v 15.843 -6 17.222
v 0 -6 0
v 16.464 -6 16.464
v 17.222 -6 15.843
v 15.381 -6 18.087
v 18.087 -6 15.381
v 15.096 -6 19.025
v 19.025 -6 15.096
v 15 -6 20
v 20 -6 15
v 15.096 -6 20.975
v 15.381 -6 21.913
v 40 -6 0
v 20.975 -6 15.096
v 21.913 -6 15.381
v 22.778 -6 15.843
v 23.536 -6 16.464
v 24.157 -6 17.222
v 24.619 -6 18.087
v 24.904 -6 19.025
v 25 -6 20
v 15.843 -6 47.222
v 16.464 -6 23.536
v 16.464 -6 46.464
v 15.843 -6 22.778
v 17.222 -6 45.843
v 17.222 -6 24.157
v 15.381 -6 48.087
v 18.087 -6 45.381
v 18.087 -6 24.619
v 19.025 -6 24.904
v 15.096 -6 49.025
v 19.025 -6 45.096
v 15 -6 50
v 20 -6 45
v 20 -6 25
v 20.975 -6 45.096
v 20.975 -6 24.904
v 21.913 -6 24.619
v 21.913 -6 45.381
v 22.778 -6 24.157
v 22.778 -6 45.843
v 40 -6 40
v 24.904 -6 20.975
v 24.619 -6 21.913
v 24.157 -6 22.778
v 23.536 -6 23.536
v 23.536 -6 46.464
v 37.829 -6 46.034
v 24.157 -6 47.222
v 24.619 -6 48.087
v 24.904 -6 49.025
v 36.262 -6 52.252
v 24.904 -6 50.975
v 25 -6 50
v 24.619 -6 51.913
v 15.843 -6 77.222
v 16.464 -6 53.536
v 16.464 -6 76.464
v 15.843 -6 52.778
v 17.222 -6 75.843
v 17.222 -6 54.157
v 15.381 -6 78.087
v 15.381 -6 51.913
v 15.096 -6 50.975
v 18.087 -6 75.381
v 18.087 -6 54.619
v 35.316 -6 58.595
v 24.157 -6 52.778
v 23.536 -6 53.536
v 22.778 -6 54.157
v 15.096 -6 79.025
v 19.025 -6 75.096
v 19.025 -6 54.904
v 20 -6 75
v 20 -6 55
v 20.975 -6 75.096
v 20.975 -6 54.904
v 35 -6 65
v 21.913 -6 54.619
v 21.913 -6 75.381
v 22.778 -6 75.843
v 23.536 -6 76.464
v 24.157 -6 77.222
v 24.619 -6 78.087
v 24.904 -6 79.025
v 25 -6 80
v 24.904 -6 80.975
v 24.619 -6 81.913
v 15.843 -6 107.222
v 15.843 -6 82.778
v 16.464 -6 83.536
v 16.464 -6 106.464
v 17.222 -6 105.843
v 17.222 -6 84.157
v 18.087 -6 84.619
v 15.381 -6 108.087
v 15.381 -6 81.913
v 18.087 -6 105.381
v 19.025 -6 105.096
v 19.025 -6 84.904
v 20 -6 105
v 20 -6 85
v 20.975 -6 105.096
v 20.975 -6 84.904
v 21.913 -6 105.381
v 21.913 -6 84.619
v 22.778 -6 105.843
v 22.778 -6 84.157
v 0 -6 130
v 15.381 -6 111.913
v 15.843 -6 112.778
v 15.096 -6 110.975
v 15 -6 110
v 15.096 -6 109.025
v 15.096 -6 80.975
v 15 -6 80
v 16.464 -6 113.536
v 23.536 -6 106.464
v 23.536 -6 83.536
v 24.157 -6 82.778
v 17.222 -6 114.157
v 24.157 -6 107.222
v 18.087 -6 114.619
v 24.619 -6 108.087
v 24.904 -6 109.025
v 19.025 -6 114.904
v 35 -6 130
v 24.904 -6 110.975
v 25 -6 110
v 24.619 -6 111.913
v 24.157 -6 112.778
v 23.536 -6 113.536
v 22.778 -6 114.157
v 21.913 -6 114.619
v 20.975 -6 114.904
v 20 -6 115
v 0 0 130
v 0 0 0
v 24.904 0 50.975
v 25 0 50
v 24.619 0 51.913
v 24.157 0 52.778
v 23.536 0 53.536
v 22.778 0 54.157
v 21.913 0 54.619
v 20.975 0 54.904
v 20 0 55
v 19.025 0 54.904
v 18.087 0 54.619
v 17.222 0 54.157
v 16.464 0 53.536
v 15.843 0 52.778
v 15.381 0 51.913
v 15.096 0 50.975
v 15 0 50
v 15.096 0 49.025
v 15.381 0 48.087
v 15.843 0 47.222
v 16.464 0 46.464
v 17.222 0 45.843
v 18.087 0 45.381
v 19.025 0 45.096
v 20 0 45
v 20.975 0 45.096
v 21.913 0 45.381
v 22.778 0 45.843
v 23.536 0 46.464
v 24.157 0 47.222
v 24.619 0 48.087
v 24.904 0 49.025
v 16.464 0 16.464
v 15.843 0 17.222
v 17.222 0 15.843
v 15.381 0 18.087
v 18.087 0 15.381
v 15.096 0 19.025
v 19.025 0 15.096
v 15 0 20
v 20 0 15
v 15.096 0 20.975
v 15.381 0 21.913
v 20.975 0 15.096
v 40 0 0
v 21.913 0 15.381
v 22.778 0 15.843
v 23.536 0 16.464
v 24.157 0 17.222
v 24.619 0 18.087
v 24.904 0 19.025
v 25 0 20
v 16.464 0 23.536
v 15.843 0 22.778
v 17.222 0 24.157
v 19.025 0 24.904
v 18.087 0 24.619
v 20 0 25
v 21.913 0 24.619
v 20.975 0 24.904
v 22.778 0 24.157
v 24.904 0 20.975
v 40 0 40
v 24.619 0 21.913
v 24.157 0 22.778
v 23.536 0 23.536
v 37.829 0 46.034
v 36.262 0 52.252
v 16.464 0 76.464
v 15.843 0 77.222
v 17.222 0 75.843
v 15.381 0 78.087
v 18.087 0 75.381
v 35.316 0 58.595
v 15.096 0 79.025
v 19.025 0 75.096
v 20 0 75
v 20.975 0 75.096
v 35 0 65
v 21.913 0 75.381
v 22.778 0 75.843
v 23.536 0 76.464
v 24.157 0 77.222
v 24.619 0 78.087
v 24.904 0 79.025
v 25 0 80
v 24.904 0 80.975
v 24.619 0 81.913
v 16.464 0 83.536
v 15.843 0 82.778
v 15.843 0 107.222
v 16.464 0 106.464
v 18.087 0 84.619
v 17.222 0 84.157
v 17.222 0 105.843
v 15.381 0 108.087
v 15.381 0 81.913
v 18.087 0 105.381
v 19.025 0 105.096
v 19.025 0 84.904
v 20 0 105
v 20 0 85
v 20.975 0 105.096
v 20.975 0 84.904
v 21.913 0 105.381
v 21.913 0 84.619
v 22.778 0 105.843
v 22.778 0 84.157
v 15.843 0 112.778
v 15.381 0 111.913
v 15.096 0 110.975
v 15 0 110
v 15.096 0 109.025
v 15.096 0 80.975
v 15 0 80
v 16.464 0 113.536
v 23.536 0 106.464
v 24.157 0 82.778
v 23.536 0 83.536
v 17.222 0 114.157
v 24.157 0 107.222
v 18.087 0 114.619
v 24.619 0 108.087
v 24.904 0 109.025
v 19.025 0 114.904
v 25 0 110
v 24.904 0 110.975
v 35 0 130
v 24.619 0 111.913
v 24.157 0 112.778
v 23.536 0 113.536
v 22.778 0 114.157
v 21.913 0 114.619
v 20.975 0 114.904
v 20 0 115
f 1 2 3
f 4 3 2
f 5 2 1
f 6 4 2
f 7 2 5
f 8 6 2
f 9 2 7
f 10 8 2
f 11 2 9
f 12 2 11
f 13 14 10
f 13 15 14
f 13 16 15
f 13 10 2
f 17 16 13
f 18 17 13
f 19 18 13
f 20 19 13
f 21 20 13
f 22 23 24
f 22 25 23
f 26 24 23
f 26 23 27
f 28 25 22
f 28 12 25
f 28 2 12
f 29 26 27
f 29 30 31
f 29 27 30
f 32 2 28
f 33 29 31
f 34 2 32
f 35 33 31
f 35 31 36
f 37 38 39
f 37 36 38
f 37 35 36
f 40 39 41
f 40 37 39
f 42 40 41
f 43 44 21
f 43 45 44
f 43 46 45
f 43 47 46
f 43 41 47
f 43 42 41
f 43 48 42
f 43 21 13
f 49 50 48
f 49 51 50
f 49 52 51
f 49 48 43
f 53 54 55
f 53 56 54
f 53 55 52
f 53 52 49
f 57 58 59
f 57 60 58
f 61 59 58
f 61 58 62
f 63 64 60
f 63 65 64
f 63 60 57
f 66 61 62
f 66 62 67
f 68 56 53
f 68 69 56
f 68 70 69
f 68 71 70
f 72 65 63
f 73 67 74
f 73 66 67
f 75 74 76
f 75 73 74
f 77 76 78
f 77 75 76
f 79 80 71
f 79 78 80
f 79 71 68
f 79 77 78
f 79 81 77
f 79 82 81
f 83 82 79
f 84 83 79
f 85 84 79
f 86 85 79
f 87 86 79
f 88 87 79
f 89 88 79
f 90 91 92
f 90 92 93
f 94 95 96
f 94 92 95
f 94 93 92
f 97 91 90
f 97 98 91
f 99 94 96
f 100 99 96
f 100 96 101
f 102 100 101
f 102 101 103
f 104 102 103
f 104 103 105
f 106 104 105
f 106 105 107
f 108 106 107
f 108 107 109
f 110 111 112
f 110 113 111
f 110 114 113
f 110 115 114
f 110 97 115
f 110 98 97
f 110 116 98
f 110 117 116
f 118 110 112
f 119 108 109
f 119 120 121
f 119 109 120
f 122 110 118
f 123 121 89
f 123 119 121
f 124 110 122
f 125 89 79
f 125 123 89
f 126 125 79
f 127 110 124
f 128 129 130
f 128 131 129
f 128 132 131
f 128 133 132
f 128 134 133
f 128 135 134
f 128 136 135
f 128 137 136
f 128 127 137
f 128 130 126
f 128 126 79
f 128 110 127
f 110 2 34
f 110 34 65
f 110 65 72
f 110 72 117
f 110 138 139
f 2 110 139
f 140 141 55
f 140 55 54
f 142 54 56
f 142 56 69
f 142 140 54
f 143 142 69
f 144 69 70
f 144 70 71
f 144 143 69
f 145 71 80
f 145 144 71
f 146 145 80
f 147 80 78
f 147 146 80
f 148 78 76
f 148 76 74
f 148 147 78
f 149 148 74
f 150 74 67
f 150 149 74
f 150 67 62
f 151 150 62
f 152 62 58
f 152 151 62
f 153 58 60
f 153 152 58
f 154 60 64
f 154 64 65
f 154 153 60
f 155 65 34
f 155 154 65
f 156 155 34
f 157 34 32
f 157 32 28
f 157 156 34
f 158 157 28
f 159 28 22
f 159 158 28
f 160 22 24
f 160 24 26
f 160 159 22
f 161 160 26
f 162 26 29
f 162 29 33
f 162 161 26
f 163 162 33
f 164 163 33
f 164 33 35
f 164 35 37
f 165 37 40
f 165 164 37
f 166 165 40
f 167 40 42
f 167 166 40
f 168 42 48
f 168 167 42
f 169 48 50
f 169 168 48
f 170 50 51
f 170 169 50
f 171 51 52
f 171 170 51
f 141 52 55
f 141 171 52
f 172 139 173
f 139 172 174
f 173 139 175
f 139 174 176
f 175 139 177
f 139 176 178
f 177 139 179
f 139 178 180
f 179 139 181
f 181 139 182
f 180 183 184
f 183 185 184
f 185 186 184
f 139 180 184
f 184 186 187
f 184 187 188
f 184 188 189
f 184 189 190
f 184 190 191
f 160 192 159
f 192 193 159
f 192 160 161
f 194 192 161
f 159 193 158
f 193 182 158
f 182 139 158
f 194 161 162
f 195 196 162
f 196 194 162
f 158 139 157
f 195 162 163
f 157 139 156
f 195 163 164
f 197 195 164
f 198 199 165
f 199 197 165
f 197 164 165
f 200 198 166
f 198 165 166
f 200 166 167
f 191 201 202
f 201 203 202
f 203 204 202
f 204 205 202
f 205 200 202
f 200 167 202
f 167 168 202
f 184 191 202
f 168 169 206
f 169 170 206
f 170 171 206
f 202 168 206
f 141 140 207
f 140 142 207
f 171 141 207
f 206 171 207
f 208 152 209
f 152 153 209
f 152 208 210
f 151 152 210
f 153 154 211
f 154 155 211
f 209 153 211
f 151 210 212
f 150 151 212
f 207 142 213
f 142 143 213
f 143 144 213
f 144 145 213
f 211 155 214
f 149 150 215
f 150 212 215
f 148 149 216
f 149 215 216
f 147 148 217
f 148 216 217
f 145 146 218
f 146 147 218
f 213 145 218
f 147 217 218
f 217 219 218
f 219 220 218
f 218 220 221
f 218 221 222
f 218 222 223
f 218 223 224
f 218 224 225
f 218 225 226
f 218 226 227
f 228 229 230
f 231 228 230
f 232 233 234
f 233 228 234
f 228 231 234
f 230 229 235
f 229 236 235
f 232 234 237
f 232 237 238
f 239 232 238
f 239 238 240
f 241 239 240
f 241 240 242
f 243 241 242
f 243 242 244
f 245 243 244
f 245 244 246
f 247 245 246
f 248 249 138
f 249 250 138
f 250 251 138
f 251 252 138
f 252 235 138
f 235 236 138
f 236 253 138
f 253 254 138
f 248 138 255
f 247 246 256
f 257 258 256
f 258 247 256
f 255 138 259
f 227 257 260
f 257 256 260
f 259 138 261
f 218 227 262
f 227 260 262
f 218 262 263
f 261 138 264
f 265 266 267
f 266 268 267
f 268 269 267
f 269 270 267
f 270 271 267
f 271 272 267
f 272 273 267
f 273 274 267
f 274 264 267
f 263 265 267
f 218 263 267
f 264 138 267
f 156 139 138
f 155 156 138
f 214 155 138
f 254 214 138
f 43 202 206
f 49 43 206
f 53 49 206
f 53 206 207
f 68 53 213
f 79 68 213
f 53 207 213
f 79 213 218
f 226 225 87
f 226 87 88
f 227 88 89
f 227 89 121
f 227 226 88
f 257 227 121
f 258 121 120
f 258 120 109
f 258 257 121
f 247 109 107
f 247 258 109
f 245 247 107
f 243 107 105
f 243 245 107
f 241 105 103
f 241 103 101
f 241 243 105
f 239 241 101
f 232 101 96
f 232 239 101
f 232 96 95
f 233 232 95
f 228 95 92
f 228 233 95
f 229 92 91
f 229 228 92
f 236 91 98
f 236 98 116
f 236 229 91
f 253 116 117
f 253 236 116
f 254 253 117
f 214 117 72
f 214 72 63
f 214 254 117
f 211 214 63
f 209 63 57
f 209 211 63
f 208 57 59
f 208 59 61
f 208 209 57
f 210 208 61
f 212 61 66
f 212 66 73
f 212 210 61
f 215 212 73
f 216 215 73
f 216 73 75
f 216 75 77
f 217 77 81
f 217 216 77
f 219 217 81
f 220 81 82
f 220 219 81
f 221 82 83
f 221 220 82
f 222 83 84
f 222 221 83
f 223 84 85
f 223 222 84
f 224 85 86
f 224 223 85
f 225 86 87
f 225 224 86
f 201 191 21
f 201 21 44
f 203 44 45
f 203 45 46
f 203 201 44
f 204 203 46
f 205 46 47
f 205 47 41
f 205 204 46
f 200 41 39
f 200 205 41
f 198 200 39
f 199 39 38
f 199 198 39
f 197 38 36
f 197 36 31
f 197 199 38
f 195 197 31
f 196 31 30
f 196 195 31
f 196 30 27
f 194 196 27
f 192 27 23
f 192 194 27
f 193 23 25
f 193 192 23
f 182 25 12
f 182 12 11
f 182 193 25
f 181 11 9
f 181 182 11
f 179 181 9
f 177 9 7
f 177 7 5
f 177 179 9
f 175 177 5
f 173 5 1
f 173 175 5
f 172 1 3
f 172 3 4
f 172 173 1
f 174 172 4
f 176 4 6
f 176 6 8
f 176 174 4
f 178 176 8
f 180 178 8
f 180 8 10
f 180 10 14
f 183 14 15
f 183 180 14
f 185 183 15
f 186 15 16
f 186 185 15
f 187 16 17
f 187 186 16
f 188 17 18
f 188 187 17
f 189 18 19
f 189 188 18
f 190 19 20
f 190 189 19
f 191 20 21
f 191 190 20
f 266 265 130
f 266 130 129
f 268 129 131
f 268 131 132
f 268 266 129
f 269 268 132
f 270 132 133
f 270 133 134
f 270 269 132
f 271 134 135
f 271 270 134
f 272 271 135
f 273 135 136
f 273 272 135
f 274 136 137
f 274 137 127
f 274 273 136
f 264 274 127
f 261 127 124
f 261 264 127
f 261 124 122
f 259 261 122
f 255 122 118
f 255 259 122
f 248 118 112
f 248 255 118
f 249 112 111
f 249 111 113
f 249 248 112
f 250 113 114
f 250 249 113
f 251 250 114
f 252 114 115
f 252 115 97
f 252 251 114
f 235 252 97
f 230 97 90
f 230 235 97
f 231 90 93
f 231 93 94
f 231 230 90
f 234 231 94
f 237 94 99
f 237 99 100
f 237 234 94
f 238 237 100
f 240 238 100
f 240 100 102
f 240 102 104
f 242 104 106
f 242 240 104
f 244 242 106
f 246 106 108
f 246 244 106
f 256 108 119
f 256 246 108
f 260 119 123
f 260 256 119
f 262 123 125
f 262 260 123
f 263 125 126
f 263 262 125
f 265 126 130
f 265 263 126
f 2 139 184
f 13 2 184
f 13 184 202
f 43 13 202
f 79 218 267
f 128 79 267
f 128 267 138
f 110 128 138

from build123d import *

# Parameters (mm, degrees)
F0_R     = 5
F1_DEPTH = 6


with BuildPart() as f1:
    # F0 (on Front) → F1 (new body)
    with BuildSketch(Plane.XZ):
        with BuildLine():
            Line((0, 130), (0, 0))
            Line((0, 0), (40, 0))
            Line((40, 0), (40, 40))
            ThreePointArc((40, 40), (36.262256, 52.252451), (35, 65))
            Line((35, 65), (35, 130))
            Line((35, 130), (0, 130))
        make_face()
        with Locations((20, 20)):
            Circle(F0_R, mode=Mode.SUBTRACT)
        with Locations((20, 50)):
            Circle(F0_R, mode=Mode.SUBTRACT)
        with Locations((20, 80)):
            Circle(F0_R, mode=Mode.SUBTRACT)
        with Locations((20, 110)):
            Circle(F0_R, mode=Mode.SUBTRACT)
    extrude(amount=F1_DEPTH)


solid = f1.part
